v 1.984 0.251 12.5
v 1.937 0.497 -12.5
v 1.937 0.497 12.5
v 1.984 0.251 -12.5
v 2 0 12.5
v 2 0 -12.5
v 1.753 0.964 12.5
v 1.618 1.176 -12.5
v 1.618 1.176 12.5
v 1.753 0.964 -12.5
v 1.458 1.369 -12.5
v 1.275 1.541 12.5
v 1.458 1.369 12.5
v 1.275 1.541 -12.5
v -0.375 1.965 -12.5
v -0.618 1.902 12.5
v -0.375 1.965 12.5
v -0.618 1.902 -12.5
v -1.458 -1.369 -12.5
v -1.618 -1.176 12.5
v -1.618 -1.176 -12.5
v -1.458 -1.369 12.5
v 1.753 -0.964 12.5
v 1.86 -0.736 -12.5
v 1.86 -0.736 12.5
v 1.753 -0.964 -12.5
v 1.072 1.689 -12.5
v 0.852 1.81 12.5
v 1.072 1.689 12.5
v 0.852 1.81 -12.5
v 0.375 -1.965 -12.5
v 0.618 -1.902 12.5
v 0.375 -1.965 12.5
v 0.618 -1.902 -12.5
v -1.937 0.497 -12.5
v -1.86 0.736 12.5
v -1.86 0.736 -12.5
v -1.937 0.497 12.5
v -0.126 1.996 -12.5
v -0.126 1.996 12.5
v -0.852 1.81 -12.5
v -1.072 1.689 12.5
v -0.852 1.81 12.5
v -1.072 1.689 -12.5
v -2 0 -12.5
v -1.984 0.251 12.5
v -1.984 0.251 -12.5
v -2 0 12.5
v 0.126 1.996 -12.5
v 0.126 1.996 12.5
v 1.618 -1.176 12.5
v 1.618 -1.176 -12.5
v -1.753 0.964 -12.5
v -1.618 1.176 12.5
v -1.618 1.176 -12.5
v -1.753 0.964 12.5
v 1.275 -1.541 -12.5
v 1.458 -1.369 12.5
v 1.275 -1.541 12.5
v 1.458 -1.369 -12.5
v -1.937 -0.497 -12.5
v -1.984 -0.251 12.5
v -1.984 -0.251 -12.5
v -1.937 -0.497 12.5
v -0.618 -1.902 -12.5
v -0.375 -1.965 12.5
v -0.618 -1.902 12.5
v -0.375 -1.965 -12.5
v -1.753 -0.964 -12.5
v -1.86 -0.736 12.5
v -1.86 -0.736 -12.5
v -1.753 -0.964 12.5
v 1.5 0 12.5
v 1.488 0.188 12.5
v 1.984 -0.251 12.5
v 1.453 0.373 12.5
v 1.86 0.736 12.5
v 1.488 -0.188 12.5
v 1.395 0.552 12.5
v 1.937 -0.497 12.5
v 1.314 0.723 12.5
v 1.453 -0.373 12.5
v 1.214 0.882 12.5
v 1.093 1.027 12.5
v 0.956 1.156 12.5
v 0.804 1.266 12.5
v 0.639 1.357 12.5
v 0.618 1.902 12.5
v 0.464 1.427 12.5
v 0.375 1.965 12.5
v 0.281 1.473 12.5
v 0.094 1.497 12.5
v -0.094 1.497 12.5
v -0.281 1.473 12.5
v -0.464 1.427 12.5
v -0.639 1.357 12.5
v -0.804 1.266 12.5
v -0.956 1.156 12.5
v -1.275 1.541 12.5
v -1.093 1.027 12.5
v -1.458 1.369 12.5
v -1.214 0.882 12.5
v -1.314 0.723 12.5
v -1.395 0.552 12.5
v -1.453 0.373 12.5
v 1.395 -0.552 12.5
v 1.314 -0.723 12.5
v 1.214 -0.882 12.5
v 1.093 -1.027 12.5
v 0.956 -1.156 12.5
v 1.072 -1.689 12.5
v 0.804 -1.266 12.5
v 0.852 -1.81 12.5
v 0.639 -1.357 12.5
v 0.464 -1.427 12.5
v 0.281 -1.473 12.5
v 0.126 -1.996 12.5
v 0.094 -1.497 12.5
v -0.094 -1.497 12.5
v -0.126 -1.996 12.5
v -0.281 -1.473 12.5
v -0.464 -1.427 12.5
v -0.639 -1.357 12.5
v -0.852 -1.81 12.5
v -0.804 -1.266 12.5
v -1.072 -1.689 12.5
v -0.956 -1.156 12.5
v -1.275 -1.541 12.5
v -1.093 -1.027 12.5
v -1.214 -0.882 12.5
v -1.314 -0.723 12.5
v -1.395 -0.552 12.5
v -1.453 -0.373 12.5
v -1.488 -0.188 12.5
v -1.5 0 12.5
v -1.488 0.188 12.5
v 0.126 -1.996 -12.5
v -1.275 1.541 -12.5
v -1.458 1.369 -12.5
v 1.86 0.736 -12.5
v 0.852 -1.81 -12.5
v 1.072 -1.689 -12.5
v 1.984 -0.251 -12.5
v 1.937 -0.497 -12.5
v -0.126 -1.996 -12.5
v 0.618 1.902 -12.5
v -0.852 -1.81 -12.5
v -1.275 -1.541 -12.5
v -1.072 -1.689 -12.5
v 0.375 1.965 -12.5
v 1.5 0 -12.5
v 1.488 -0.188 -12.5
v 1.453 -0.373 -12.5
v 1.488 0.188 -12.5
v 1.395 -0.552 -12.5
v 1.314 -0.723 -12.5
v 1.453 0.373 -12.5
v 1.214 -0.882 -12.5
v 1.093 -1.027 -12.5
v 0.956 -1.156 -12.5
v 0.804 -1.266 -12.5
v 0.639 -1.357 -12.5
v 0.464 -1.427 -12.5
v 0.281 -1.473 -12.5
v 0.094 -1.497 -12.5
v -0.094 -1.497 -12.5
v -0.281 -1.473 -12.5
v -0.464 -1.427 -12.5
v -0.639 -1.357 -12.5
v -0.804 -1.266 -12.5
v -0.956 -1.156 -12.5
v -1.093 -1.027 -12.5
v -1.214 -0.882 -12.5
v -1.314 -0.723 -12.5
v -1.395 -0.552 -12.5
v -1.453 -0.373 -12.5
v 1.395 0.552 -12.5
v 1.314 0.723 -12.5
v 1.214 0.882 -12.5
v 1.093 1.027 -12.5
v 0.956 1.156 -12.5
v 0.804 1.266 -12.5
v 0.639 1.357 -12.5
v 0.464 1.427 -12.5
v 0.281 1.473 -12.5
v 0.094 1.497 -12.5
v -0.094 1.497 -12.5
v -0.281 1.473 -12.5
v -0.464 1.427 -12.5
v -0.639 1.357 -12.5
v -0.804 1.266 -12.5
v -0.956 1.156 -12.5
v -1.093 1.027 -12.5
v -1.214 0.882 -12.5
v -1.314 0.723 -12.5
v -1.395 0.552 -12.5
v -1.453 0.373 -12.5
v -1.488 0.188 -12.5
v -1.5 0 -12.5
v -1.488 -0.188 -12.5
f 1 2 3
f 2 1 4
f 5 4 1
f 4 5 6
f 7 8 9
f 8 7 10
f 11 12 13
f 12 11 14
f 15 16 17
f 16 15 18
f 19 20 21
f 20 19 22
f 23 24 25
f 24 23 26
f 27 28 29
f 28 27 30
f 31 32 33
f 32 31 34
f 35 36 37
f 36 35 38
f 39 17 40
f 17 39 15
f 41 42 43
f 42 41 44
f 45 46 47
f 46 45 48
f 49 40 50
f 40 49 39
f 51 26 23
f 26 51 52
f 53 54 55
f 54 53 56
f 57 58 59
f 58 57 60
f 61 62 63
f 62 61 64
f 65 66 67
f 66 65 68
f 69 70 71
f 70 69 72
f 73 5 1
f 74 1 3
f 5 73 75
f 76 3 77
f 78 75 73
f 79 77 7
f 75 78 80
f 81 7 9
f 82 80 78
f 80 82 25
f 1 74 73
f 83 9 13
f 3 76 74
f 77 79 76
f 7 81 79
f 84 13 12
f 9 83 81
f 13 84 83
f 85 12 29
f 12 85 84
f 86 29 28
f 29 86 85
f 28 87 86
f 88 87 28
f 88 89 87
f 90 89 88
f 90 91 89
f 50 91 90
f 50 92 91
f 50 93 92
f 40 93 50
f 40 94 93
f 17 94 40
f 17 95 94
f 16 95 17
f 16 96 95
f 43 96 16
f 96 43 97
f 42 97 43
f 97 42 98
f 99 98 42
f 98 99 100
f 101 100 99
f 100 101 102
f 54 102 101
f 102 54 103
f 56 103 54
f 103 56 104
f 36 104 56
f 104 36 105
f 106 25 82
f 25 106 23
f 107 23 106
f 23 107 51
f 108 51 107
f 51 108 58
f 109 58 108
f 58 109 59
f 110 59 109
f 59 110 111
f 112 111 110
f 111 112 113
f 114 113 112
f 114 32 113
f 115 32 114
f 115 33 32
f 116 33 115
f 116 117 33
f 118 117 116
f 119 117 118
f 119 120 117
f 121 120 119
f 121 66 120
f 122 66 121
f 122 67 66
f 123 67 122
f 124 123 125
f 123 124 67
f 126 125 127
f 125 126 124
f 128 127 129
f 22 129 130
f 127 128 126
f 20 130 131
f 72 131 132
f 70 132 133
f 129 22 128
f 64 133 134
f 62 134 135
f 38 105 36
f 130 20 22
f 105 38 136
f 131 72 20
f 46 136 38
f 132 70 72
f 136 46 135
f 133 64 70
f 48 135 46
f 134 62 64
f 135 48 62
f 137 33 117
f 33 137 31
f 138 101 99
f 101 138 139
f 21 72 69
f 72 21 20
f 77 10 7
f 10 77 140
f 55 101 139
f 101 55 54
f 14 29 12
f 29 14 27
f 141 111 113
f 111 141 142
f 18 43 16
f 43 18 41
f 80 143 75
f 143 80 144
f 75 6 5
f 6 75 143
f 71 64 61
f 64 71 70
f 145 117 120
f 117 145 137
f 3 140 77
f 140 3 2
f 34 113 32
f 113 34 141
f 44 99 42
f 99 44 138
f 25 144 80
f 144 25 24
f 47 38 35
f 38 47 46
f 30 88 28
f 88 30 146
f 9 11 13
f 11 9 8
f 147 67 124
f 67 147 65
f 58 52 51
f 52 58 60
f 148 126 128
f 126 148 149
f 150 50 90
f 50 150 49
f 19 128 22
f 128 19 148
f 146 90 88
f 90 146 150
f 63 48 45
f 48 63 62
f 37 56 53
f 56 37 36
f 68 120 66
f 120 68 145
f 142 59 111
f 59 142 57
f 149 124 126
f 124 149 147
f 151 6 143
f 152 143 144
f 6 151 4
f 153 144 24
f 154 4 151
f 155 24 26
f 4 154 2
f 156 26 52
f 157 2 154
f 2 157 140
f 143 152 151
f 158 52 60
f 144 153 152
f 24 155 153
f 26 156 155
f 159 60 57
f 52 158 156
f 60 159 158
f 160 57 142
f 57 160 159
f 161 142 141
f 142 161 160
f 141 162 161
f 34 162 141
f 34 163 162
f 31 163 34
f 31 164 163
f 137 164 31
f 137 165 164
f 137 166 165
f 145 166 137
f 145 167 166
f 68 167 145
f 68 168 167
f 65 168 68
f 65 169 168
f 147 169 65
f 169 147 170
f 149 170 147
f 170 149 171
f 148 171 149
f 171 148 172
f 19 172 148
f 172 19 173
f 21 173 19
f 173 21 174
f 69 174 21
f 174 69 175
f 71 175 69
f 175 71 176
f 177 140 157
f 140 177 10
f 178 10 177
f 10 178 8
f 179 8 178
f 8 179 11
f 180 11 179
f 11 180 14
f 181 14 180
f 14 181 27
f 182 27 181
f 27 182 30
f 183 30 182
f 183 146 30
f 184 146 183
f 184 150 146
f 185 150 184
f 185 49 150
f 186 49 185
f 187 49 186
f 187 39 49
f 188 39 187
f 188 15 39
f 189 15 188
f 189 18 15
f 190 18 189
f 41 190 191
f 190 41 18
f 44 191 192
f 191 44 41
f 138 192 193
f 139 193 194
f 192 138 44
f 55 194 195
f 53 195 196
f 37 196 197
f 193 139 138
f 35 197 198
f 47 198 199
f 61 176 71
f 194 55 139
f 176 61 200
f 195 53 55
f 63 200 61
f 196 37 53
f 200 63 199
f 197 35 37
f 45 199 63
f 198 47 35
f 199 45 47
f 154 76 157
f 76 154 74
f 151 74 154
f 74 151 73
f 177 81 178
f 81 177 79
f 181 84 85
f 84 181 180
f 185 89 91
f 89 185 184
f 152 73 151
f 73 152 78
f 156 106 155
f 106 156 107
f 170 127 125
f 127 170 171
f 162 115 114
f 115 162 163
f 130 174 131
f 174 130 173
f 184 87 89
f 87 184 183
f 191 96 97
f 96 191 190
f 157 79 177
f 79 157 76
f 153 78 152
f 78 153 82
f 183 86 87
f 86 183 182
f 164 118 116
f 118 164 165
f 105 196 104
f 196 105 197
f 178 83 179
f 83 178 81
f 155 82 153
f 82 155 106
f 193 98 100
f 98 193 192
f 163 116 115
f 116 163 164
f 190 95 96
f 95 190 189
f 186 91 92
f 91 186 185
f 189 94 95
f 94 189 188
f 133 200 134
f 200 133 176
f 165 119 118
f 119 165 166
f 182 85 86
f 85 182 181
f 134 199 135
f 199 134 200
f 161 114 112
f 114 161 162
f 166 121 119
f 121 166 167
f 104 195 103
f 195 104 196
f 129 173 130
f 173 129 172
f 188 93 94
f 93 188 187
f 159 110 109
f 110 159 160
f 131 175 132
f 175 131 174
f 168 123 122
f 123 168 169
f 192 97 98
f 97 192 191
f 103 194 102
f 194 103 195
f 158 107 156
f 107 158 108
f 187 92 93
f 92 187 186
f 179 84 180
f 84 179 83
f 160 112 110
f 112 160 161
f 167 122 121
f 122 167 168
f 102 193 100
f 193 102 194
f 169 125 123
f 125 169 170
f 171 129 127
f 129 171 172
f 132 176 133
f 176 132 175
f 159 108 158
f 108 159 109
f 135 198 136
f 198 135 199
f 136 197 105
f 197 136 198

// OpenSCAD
$fn = 50;


difference() {
	union() {
		translate(v = [0, 0, -12.5000000000]) {
			cylinder(h = 25, r = 2.0000000000);
		}
	}
	union() {
		translate(v = [0, 0, -100.0000000000]) {
			cylinder(h = 200, r = 1.5000000000);
		}
	}
}
